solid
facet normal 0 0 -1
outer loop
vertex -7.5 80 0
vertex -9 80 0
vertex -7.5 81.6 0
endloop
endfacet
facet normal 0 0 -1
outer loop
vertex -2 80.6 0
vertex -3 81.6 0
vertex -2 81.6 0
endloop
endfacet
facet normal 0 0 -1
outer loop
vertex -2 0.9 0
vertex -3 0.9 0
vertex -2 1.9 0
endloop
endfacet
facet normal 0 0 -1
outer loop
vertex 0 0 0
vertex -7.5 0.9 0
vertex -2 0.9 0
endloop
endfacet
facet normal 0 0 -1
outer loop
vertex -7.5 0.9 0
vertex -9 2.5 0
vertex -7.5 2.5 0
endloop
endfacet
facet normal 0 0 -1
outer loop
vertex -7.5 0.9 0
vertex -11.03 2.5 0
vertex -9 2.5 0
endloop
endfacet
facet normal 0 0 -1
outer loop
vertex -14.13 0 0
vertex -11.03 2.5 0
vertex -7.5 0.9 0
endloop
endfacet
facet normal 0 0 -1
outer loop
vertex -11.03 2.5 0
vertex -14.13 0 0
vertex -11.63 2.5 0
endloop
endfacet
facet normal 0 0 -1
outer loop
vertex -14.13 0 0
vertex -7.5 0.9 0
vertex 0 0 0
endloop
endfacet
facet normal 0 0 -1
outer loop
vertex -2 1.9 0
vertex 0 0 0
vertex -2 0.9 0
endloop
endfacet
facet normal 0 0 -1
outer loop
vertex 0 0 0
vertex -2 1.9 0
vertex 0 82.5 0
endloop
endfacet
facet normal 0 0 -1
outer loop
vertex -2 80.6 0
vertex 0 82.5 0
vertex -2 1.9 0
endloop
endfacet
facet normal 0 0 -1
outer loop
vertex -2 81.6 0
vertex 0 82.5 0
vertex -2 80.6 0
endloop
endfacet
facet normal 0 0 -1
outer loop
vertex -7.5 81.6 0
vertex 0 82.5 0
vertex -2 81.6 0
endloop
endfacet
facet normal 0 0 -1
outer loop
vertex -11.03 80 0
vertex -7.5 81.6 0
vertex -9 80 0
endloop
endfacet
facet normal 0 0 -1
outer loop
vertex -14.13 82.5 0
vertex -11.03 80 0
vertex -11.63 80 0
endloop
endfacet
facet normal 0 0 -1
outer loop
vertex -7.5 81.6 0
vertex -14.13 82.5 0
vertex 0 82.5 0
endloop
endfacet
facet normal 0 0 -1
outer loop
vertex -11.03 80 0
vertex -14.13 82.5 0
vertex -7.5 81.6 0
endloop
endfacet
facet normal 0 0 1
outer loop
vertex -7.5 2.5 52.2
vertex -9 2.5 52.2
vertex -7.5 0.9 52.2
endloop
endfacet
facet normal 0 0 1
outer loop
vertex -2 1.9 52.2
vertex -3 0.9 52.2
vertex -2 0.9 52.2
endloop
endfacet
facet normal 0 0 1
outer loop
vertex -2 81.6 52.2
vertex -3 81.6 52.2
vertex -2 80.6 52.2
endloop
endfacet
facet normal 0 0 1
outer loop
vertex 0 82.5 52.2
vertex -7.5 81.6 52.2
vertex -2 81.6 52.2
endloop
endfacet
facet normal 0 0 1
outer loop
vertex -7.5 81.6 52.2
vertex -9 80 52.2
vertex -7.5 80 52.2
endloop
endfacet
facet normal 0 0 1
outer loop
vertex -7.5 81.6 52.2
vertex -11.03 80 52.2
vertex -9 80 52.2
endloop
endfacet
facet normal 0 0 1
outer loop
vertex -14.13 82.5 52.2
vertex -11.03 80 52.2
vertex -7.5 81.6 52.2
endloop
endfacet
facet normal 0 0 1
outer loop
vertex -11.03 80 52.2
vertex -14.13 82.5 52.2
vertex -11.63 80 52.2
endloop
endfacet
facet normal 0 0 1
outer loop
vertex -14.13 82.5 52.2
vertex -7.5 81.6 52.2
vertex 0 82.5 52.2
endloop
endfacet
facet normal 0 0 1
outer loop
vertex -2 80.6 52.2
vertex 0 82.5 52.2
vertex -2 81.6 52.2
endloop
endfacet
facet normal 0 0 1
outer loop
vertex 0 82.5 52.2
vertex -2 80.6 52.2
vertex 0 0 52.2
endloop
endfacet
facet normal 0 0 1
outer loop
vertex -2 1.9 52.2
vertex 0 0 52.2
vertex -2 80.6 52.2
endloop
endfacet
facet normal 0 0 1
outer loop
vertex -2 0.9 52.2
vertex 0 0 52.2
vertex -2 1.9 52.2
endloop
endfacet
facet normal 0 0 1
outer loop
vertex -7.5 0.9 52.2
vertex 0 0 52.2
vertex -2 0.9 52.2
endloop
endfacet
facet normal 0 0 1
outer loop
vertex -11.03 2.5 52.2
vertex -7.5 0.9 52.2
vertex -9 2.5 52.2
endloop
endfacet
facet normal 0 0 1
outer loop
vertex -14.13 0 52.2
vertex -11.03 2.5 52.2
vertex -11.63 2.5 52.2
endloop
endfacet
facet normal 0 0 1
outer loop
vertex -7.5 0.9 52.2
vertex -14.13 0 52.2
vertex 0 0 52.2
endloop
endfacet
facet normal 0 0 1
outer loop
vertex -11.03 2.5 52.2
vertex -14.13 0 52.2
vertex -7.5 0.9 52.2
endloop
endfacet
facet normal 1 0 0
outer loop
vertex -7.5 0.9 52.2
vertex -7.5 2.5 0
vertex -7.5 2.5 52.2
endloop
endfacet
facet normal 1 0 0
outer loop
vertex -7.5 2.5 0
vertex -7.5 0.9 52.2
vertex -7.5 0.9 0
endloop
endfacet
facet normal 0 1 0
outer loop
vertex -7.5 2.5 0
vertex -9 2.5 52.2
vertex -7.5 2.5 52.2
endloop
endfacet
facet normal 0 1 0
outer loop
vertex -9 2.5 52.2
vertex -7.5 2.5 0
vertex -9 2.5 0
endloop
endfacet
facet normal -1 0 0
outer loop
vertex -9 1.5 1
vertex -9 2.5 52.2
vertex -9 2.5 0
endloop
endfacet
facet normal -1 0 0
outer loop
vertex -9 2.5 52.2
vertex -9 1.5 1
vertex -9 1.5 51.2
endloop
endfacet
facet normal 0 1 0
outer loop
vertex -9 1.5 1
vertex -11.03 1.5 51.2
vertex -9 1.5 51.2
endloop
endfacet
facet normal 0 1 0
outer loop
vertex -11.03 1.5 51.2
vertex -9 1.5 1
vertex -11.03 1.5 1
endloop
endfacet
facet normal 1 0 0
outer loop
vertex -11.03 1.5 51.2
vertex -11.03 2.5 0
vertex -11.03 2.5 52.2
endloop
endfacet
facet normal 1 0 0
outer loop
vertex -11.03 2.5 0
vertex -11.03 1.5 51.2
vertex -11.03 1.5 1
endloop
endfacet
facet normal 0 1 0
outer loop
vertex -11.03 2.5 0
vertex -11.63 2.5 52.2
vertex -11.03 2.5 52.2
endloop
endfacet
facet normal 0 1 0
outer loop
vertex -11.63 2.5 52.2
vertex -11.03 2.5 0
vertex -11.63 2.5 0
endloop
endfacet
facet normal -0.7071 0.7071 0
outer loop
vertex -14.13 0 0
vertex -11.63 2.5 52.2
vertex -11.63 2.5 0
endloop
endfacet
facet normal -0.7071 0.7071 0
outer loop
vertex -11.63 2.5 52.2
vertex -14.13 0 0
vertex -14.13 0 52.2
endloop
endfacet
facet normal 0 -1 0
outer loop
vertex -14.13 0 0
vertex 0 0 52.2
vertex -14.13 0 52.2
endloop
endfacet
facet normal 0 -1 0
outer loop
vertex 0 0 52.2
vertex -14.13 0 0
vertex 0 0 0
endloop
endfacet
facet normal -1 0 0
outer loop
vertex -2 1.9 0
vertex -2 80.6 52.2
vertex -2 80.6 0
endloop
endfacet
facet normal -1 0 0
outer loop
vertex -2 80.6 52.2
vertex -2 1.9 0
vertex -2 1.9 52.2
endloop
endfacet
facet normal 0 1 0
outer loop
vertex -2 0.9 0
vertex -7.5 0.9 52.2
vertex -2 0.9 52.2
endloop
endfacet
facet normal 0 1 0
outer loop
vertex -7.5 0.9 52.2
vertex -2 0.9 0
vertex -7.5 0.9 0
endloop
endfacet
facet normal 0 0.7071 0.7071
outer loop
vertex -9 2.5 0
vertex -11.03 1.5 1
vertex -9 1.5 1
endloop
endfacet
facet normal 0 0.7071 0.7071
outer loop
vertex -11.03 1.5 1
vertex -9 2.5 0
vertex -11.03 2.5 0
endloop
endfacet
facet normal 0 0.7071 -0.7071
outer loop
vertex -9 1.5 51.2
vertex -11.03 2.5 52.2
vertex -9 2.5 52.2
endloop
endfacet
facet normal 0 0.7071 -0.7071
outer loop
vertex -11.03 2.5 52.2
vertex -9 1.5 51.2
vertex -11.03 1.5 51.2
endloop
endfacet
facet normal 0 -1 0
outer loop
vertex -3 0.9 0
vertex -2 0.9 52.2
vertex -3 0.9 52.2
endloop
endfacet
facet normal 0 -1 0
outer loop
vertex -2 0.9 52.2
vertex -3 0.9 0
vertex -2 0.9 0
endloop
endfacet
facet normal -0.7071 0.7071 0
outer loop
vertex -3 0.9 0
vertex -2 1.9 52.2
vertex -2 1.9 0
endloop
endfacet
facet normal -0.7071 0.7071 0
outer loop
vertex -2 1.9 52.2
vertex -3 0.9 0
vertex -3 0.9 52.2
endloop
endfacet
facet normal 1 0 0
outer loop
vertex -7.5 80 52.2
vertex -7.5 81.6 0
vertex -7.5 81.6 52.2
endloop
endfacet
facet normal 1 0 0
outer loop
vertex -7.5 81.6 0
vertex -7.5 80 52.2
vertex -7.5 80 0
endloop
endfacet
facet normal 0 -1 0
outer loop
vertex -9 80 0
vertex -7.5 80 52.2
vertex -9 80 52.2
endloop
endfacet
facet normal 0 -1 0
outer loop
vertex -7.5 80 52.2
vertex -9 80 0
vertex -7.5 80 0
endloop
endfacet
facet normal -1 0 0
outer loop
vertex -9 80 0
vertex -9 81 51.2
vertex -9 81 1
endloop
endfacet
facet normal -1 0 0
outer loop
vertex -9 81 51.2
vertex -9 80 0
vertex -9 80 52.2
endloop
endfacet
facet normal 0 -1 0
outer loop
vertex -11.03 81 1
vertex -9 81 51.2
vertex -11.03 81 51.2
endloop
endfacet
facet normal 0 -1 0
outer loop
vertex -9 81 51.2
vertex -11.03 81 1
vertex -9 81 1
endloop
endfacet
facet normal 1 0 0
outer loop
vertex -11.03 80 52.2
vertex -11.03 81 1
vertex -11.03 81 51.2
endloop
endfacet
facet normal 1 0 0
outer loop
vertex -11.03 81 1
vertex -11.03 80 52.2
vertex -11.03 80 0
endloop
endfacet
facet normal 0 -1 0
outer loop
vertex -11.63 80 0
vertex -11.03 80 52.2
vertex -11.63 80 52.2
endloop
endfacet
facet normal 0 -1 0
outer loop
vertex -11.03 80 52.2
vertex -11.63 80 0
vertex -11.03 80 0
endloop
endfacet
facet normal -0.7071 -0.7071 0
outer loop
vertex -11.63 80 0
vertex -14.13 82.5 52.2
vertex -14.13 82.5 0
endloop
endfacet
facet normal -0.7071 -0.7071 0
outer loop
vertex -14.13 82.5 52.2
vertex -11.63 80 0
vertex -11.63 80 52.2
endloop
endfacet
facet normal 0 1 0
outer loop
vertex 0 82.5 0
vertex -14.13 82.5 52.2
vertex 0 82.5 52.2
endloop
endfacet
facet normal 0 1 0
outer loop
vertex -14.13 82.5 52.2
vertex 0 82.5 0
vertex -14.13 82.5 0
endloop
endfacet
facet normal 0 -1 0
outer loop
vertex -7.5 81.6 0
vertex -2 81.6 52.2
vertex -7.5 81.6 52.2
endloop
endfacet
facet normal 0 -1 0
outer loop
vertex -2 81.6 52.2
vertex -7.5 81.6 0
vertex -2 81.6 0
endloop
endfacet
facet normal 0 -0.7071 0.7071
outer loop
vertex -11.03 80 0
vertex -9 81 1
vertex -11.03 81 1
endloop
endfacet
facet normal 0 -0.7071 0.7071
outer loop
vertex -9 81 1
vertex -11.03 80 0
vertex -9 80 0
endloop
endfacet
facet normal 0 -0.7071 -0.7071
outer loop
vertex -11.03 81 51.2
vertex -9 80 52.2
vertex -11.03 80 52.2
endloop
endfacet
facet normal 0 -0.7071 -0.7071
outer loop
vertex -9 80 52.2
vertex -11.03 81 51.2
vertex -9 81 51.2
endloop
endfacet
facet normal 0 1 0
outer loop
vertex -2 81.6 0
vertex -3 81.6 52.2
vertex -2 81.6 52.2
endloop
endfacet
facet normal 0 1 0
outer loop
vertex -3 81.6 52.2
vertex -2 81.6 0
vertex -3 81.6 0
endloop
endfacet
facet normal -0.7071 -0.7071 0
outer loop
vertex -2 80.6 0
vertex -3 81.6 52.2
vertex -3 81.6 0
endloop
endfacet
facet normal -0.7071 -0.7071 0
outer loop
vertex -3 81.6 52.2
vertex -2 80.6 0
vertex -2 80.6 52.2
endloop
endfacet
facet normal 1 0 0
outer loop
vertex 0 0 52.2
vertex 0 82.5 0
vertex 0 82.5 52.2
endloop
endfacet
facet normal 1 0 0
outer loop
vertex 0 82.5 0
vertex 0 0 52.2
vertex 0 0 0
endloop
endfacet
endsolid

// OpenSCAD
function bounded(num, minVal, maxVal) =
    (num > minVal) ? (
        (num > maxVal) ? maxVal : num
    ) : minVal;

module PCBClip(
    pcbWidth, // width of pcb to hold
    pcbLength, // length of pcb to hold
    pcbThick = 1.53, // thickness of pcb to hold
    pcbBottomClearance = 7 // space between bottom of pcb and bottom of clip
) {
    // Calculate the base thickness.  Thicker for larger PCBs, but bounded.
    baseThick = bounded((1/40)*pcbLength, 2, 5);
    // Additional clearance on the PCB thickness for the slot height
    pcbThickClearance = 0.5;
    // Amount the pcb is inserted into the clip slot
    pcbInsertDepth = 1;
    // Thickness of bottom part of clip slot
    slotBottomThick = 1.5;
    slotTopMinThick = 0.6;
    // Thickness of the arm of the clip
    clipArmThick = bounded((1/8)*pcbBottomClearance, 0.9, 3);
    // Thickness of the rear side of the slot
    slotBackThick = max(clipArmThick, 1.5);
    // The height of the part of the clip above the slot
    slotTopThick = pcbInsertDepth + slotBackThick;
    // Width of the clip base
    baseWidth = pcbWidth + 2 * pcbInsertDepth + 0.2;
    // Length of the clip base
    baseLength = pcbLength + 2*slotBackThick - 0.5;
    baseFilletSize = bounded((pcbBottomClearance - slotBottomThick) / 6, 1, 3);
    
    module ClipArm() {
        rotate([ 90, 0, 90 ])
            linear_extrude(baseWidth)
                polygon([
                    [ 0, 0 ],
                    [ 0, pcbBottomClearance + pcbThickClearance + pcbThick + slotBackThick + pcbInsertDepth + slotTopMinThick ],
                    [ slotBackThick + pcbInsertDepth, pcbBottomClearance + pcbThickClearance + pcbThick + slotTopMinThick ],
                    [ slotBackThick + pcbInsertDepth, pcbBottomClearance + pcbThickClearance + pcbThick ],
                    [ slotBackThick, pcbBottomClearance + pcbThickClearance + pcbThick ],
                    [ slotBackThick, pcbBottomClearance ],
                    [ slotBackThick + pcbInsertDepth, pcbBottomClearance ],
                    [ slotBackThick + pcbInsertDepth, pcbBottomClearance - slotBottomThick ],
                    [ clipArmThick, pcbBottomClearance - slotBottomThick ],
                    [ clipArmThick, 0 ]
                ]);
        module SideWedge() {
            translate([0, slotBackThick, pcbBottomClearance])
                linear_extrude(pcbThick + pcbThickClearance)
                    polygon([
                        [ 0, 0 ],
                        [ 0, pcbInsertDepth ],
                        [ pcbInsertDepth, 0 ]
                    ]);
        };
        SideWedge();
        translate([ baseWidth, 0, 0 ])
            mirror([ 1, 0, 0 ])
                SideWedge();
        translate([ baseWidth, clipArmThick ])
        rotate([ 0, -90, 0 ])
        linear_extrude(baseWidth)
            polygon([
                [ 0, 0 ],
                [ 0, baseFilletSize ],
                [ baseFilletSize, 0 ]
            ]);
    };
    
    // Base
    cube([ baseWidth, baseLength, baseThick ]);
    // First clip
    translate([ 0, 0, baseThick ])
        ClipArm();
    // Second clip
    translate([ 0, baseLength, baseThick ])
        mirror([ 0, 1, 0 ])
            ClipArm();
}

rotate([ 0, -90, 0 ])
    PCBClip(50, 80, 1.53);
